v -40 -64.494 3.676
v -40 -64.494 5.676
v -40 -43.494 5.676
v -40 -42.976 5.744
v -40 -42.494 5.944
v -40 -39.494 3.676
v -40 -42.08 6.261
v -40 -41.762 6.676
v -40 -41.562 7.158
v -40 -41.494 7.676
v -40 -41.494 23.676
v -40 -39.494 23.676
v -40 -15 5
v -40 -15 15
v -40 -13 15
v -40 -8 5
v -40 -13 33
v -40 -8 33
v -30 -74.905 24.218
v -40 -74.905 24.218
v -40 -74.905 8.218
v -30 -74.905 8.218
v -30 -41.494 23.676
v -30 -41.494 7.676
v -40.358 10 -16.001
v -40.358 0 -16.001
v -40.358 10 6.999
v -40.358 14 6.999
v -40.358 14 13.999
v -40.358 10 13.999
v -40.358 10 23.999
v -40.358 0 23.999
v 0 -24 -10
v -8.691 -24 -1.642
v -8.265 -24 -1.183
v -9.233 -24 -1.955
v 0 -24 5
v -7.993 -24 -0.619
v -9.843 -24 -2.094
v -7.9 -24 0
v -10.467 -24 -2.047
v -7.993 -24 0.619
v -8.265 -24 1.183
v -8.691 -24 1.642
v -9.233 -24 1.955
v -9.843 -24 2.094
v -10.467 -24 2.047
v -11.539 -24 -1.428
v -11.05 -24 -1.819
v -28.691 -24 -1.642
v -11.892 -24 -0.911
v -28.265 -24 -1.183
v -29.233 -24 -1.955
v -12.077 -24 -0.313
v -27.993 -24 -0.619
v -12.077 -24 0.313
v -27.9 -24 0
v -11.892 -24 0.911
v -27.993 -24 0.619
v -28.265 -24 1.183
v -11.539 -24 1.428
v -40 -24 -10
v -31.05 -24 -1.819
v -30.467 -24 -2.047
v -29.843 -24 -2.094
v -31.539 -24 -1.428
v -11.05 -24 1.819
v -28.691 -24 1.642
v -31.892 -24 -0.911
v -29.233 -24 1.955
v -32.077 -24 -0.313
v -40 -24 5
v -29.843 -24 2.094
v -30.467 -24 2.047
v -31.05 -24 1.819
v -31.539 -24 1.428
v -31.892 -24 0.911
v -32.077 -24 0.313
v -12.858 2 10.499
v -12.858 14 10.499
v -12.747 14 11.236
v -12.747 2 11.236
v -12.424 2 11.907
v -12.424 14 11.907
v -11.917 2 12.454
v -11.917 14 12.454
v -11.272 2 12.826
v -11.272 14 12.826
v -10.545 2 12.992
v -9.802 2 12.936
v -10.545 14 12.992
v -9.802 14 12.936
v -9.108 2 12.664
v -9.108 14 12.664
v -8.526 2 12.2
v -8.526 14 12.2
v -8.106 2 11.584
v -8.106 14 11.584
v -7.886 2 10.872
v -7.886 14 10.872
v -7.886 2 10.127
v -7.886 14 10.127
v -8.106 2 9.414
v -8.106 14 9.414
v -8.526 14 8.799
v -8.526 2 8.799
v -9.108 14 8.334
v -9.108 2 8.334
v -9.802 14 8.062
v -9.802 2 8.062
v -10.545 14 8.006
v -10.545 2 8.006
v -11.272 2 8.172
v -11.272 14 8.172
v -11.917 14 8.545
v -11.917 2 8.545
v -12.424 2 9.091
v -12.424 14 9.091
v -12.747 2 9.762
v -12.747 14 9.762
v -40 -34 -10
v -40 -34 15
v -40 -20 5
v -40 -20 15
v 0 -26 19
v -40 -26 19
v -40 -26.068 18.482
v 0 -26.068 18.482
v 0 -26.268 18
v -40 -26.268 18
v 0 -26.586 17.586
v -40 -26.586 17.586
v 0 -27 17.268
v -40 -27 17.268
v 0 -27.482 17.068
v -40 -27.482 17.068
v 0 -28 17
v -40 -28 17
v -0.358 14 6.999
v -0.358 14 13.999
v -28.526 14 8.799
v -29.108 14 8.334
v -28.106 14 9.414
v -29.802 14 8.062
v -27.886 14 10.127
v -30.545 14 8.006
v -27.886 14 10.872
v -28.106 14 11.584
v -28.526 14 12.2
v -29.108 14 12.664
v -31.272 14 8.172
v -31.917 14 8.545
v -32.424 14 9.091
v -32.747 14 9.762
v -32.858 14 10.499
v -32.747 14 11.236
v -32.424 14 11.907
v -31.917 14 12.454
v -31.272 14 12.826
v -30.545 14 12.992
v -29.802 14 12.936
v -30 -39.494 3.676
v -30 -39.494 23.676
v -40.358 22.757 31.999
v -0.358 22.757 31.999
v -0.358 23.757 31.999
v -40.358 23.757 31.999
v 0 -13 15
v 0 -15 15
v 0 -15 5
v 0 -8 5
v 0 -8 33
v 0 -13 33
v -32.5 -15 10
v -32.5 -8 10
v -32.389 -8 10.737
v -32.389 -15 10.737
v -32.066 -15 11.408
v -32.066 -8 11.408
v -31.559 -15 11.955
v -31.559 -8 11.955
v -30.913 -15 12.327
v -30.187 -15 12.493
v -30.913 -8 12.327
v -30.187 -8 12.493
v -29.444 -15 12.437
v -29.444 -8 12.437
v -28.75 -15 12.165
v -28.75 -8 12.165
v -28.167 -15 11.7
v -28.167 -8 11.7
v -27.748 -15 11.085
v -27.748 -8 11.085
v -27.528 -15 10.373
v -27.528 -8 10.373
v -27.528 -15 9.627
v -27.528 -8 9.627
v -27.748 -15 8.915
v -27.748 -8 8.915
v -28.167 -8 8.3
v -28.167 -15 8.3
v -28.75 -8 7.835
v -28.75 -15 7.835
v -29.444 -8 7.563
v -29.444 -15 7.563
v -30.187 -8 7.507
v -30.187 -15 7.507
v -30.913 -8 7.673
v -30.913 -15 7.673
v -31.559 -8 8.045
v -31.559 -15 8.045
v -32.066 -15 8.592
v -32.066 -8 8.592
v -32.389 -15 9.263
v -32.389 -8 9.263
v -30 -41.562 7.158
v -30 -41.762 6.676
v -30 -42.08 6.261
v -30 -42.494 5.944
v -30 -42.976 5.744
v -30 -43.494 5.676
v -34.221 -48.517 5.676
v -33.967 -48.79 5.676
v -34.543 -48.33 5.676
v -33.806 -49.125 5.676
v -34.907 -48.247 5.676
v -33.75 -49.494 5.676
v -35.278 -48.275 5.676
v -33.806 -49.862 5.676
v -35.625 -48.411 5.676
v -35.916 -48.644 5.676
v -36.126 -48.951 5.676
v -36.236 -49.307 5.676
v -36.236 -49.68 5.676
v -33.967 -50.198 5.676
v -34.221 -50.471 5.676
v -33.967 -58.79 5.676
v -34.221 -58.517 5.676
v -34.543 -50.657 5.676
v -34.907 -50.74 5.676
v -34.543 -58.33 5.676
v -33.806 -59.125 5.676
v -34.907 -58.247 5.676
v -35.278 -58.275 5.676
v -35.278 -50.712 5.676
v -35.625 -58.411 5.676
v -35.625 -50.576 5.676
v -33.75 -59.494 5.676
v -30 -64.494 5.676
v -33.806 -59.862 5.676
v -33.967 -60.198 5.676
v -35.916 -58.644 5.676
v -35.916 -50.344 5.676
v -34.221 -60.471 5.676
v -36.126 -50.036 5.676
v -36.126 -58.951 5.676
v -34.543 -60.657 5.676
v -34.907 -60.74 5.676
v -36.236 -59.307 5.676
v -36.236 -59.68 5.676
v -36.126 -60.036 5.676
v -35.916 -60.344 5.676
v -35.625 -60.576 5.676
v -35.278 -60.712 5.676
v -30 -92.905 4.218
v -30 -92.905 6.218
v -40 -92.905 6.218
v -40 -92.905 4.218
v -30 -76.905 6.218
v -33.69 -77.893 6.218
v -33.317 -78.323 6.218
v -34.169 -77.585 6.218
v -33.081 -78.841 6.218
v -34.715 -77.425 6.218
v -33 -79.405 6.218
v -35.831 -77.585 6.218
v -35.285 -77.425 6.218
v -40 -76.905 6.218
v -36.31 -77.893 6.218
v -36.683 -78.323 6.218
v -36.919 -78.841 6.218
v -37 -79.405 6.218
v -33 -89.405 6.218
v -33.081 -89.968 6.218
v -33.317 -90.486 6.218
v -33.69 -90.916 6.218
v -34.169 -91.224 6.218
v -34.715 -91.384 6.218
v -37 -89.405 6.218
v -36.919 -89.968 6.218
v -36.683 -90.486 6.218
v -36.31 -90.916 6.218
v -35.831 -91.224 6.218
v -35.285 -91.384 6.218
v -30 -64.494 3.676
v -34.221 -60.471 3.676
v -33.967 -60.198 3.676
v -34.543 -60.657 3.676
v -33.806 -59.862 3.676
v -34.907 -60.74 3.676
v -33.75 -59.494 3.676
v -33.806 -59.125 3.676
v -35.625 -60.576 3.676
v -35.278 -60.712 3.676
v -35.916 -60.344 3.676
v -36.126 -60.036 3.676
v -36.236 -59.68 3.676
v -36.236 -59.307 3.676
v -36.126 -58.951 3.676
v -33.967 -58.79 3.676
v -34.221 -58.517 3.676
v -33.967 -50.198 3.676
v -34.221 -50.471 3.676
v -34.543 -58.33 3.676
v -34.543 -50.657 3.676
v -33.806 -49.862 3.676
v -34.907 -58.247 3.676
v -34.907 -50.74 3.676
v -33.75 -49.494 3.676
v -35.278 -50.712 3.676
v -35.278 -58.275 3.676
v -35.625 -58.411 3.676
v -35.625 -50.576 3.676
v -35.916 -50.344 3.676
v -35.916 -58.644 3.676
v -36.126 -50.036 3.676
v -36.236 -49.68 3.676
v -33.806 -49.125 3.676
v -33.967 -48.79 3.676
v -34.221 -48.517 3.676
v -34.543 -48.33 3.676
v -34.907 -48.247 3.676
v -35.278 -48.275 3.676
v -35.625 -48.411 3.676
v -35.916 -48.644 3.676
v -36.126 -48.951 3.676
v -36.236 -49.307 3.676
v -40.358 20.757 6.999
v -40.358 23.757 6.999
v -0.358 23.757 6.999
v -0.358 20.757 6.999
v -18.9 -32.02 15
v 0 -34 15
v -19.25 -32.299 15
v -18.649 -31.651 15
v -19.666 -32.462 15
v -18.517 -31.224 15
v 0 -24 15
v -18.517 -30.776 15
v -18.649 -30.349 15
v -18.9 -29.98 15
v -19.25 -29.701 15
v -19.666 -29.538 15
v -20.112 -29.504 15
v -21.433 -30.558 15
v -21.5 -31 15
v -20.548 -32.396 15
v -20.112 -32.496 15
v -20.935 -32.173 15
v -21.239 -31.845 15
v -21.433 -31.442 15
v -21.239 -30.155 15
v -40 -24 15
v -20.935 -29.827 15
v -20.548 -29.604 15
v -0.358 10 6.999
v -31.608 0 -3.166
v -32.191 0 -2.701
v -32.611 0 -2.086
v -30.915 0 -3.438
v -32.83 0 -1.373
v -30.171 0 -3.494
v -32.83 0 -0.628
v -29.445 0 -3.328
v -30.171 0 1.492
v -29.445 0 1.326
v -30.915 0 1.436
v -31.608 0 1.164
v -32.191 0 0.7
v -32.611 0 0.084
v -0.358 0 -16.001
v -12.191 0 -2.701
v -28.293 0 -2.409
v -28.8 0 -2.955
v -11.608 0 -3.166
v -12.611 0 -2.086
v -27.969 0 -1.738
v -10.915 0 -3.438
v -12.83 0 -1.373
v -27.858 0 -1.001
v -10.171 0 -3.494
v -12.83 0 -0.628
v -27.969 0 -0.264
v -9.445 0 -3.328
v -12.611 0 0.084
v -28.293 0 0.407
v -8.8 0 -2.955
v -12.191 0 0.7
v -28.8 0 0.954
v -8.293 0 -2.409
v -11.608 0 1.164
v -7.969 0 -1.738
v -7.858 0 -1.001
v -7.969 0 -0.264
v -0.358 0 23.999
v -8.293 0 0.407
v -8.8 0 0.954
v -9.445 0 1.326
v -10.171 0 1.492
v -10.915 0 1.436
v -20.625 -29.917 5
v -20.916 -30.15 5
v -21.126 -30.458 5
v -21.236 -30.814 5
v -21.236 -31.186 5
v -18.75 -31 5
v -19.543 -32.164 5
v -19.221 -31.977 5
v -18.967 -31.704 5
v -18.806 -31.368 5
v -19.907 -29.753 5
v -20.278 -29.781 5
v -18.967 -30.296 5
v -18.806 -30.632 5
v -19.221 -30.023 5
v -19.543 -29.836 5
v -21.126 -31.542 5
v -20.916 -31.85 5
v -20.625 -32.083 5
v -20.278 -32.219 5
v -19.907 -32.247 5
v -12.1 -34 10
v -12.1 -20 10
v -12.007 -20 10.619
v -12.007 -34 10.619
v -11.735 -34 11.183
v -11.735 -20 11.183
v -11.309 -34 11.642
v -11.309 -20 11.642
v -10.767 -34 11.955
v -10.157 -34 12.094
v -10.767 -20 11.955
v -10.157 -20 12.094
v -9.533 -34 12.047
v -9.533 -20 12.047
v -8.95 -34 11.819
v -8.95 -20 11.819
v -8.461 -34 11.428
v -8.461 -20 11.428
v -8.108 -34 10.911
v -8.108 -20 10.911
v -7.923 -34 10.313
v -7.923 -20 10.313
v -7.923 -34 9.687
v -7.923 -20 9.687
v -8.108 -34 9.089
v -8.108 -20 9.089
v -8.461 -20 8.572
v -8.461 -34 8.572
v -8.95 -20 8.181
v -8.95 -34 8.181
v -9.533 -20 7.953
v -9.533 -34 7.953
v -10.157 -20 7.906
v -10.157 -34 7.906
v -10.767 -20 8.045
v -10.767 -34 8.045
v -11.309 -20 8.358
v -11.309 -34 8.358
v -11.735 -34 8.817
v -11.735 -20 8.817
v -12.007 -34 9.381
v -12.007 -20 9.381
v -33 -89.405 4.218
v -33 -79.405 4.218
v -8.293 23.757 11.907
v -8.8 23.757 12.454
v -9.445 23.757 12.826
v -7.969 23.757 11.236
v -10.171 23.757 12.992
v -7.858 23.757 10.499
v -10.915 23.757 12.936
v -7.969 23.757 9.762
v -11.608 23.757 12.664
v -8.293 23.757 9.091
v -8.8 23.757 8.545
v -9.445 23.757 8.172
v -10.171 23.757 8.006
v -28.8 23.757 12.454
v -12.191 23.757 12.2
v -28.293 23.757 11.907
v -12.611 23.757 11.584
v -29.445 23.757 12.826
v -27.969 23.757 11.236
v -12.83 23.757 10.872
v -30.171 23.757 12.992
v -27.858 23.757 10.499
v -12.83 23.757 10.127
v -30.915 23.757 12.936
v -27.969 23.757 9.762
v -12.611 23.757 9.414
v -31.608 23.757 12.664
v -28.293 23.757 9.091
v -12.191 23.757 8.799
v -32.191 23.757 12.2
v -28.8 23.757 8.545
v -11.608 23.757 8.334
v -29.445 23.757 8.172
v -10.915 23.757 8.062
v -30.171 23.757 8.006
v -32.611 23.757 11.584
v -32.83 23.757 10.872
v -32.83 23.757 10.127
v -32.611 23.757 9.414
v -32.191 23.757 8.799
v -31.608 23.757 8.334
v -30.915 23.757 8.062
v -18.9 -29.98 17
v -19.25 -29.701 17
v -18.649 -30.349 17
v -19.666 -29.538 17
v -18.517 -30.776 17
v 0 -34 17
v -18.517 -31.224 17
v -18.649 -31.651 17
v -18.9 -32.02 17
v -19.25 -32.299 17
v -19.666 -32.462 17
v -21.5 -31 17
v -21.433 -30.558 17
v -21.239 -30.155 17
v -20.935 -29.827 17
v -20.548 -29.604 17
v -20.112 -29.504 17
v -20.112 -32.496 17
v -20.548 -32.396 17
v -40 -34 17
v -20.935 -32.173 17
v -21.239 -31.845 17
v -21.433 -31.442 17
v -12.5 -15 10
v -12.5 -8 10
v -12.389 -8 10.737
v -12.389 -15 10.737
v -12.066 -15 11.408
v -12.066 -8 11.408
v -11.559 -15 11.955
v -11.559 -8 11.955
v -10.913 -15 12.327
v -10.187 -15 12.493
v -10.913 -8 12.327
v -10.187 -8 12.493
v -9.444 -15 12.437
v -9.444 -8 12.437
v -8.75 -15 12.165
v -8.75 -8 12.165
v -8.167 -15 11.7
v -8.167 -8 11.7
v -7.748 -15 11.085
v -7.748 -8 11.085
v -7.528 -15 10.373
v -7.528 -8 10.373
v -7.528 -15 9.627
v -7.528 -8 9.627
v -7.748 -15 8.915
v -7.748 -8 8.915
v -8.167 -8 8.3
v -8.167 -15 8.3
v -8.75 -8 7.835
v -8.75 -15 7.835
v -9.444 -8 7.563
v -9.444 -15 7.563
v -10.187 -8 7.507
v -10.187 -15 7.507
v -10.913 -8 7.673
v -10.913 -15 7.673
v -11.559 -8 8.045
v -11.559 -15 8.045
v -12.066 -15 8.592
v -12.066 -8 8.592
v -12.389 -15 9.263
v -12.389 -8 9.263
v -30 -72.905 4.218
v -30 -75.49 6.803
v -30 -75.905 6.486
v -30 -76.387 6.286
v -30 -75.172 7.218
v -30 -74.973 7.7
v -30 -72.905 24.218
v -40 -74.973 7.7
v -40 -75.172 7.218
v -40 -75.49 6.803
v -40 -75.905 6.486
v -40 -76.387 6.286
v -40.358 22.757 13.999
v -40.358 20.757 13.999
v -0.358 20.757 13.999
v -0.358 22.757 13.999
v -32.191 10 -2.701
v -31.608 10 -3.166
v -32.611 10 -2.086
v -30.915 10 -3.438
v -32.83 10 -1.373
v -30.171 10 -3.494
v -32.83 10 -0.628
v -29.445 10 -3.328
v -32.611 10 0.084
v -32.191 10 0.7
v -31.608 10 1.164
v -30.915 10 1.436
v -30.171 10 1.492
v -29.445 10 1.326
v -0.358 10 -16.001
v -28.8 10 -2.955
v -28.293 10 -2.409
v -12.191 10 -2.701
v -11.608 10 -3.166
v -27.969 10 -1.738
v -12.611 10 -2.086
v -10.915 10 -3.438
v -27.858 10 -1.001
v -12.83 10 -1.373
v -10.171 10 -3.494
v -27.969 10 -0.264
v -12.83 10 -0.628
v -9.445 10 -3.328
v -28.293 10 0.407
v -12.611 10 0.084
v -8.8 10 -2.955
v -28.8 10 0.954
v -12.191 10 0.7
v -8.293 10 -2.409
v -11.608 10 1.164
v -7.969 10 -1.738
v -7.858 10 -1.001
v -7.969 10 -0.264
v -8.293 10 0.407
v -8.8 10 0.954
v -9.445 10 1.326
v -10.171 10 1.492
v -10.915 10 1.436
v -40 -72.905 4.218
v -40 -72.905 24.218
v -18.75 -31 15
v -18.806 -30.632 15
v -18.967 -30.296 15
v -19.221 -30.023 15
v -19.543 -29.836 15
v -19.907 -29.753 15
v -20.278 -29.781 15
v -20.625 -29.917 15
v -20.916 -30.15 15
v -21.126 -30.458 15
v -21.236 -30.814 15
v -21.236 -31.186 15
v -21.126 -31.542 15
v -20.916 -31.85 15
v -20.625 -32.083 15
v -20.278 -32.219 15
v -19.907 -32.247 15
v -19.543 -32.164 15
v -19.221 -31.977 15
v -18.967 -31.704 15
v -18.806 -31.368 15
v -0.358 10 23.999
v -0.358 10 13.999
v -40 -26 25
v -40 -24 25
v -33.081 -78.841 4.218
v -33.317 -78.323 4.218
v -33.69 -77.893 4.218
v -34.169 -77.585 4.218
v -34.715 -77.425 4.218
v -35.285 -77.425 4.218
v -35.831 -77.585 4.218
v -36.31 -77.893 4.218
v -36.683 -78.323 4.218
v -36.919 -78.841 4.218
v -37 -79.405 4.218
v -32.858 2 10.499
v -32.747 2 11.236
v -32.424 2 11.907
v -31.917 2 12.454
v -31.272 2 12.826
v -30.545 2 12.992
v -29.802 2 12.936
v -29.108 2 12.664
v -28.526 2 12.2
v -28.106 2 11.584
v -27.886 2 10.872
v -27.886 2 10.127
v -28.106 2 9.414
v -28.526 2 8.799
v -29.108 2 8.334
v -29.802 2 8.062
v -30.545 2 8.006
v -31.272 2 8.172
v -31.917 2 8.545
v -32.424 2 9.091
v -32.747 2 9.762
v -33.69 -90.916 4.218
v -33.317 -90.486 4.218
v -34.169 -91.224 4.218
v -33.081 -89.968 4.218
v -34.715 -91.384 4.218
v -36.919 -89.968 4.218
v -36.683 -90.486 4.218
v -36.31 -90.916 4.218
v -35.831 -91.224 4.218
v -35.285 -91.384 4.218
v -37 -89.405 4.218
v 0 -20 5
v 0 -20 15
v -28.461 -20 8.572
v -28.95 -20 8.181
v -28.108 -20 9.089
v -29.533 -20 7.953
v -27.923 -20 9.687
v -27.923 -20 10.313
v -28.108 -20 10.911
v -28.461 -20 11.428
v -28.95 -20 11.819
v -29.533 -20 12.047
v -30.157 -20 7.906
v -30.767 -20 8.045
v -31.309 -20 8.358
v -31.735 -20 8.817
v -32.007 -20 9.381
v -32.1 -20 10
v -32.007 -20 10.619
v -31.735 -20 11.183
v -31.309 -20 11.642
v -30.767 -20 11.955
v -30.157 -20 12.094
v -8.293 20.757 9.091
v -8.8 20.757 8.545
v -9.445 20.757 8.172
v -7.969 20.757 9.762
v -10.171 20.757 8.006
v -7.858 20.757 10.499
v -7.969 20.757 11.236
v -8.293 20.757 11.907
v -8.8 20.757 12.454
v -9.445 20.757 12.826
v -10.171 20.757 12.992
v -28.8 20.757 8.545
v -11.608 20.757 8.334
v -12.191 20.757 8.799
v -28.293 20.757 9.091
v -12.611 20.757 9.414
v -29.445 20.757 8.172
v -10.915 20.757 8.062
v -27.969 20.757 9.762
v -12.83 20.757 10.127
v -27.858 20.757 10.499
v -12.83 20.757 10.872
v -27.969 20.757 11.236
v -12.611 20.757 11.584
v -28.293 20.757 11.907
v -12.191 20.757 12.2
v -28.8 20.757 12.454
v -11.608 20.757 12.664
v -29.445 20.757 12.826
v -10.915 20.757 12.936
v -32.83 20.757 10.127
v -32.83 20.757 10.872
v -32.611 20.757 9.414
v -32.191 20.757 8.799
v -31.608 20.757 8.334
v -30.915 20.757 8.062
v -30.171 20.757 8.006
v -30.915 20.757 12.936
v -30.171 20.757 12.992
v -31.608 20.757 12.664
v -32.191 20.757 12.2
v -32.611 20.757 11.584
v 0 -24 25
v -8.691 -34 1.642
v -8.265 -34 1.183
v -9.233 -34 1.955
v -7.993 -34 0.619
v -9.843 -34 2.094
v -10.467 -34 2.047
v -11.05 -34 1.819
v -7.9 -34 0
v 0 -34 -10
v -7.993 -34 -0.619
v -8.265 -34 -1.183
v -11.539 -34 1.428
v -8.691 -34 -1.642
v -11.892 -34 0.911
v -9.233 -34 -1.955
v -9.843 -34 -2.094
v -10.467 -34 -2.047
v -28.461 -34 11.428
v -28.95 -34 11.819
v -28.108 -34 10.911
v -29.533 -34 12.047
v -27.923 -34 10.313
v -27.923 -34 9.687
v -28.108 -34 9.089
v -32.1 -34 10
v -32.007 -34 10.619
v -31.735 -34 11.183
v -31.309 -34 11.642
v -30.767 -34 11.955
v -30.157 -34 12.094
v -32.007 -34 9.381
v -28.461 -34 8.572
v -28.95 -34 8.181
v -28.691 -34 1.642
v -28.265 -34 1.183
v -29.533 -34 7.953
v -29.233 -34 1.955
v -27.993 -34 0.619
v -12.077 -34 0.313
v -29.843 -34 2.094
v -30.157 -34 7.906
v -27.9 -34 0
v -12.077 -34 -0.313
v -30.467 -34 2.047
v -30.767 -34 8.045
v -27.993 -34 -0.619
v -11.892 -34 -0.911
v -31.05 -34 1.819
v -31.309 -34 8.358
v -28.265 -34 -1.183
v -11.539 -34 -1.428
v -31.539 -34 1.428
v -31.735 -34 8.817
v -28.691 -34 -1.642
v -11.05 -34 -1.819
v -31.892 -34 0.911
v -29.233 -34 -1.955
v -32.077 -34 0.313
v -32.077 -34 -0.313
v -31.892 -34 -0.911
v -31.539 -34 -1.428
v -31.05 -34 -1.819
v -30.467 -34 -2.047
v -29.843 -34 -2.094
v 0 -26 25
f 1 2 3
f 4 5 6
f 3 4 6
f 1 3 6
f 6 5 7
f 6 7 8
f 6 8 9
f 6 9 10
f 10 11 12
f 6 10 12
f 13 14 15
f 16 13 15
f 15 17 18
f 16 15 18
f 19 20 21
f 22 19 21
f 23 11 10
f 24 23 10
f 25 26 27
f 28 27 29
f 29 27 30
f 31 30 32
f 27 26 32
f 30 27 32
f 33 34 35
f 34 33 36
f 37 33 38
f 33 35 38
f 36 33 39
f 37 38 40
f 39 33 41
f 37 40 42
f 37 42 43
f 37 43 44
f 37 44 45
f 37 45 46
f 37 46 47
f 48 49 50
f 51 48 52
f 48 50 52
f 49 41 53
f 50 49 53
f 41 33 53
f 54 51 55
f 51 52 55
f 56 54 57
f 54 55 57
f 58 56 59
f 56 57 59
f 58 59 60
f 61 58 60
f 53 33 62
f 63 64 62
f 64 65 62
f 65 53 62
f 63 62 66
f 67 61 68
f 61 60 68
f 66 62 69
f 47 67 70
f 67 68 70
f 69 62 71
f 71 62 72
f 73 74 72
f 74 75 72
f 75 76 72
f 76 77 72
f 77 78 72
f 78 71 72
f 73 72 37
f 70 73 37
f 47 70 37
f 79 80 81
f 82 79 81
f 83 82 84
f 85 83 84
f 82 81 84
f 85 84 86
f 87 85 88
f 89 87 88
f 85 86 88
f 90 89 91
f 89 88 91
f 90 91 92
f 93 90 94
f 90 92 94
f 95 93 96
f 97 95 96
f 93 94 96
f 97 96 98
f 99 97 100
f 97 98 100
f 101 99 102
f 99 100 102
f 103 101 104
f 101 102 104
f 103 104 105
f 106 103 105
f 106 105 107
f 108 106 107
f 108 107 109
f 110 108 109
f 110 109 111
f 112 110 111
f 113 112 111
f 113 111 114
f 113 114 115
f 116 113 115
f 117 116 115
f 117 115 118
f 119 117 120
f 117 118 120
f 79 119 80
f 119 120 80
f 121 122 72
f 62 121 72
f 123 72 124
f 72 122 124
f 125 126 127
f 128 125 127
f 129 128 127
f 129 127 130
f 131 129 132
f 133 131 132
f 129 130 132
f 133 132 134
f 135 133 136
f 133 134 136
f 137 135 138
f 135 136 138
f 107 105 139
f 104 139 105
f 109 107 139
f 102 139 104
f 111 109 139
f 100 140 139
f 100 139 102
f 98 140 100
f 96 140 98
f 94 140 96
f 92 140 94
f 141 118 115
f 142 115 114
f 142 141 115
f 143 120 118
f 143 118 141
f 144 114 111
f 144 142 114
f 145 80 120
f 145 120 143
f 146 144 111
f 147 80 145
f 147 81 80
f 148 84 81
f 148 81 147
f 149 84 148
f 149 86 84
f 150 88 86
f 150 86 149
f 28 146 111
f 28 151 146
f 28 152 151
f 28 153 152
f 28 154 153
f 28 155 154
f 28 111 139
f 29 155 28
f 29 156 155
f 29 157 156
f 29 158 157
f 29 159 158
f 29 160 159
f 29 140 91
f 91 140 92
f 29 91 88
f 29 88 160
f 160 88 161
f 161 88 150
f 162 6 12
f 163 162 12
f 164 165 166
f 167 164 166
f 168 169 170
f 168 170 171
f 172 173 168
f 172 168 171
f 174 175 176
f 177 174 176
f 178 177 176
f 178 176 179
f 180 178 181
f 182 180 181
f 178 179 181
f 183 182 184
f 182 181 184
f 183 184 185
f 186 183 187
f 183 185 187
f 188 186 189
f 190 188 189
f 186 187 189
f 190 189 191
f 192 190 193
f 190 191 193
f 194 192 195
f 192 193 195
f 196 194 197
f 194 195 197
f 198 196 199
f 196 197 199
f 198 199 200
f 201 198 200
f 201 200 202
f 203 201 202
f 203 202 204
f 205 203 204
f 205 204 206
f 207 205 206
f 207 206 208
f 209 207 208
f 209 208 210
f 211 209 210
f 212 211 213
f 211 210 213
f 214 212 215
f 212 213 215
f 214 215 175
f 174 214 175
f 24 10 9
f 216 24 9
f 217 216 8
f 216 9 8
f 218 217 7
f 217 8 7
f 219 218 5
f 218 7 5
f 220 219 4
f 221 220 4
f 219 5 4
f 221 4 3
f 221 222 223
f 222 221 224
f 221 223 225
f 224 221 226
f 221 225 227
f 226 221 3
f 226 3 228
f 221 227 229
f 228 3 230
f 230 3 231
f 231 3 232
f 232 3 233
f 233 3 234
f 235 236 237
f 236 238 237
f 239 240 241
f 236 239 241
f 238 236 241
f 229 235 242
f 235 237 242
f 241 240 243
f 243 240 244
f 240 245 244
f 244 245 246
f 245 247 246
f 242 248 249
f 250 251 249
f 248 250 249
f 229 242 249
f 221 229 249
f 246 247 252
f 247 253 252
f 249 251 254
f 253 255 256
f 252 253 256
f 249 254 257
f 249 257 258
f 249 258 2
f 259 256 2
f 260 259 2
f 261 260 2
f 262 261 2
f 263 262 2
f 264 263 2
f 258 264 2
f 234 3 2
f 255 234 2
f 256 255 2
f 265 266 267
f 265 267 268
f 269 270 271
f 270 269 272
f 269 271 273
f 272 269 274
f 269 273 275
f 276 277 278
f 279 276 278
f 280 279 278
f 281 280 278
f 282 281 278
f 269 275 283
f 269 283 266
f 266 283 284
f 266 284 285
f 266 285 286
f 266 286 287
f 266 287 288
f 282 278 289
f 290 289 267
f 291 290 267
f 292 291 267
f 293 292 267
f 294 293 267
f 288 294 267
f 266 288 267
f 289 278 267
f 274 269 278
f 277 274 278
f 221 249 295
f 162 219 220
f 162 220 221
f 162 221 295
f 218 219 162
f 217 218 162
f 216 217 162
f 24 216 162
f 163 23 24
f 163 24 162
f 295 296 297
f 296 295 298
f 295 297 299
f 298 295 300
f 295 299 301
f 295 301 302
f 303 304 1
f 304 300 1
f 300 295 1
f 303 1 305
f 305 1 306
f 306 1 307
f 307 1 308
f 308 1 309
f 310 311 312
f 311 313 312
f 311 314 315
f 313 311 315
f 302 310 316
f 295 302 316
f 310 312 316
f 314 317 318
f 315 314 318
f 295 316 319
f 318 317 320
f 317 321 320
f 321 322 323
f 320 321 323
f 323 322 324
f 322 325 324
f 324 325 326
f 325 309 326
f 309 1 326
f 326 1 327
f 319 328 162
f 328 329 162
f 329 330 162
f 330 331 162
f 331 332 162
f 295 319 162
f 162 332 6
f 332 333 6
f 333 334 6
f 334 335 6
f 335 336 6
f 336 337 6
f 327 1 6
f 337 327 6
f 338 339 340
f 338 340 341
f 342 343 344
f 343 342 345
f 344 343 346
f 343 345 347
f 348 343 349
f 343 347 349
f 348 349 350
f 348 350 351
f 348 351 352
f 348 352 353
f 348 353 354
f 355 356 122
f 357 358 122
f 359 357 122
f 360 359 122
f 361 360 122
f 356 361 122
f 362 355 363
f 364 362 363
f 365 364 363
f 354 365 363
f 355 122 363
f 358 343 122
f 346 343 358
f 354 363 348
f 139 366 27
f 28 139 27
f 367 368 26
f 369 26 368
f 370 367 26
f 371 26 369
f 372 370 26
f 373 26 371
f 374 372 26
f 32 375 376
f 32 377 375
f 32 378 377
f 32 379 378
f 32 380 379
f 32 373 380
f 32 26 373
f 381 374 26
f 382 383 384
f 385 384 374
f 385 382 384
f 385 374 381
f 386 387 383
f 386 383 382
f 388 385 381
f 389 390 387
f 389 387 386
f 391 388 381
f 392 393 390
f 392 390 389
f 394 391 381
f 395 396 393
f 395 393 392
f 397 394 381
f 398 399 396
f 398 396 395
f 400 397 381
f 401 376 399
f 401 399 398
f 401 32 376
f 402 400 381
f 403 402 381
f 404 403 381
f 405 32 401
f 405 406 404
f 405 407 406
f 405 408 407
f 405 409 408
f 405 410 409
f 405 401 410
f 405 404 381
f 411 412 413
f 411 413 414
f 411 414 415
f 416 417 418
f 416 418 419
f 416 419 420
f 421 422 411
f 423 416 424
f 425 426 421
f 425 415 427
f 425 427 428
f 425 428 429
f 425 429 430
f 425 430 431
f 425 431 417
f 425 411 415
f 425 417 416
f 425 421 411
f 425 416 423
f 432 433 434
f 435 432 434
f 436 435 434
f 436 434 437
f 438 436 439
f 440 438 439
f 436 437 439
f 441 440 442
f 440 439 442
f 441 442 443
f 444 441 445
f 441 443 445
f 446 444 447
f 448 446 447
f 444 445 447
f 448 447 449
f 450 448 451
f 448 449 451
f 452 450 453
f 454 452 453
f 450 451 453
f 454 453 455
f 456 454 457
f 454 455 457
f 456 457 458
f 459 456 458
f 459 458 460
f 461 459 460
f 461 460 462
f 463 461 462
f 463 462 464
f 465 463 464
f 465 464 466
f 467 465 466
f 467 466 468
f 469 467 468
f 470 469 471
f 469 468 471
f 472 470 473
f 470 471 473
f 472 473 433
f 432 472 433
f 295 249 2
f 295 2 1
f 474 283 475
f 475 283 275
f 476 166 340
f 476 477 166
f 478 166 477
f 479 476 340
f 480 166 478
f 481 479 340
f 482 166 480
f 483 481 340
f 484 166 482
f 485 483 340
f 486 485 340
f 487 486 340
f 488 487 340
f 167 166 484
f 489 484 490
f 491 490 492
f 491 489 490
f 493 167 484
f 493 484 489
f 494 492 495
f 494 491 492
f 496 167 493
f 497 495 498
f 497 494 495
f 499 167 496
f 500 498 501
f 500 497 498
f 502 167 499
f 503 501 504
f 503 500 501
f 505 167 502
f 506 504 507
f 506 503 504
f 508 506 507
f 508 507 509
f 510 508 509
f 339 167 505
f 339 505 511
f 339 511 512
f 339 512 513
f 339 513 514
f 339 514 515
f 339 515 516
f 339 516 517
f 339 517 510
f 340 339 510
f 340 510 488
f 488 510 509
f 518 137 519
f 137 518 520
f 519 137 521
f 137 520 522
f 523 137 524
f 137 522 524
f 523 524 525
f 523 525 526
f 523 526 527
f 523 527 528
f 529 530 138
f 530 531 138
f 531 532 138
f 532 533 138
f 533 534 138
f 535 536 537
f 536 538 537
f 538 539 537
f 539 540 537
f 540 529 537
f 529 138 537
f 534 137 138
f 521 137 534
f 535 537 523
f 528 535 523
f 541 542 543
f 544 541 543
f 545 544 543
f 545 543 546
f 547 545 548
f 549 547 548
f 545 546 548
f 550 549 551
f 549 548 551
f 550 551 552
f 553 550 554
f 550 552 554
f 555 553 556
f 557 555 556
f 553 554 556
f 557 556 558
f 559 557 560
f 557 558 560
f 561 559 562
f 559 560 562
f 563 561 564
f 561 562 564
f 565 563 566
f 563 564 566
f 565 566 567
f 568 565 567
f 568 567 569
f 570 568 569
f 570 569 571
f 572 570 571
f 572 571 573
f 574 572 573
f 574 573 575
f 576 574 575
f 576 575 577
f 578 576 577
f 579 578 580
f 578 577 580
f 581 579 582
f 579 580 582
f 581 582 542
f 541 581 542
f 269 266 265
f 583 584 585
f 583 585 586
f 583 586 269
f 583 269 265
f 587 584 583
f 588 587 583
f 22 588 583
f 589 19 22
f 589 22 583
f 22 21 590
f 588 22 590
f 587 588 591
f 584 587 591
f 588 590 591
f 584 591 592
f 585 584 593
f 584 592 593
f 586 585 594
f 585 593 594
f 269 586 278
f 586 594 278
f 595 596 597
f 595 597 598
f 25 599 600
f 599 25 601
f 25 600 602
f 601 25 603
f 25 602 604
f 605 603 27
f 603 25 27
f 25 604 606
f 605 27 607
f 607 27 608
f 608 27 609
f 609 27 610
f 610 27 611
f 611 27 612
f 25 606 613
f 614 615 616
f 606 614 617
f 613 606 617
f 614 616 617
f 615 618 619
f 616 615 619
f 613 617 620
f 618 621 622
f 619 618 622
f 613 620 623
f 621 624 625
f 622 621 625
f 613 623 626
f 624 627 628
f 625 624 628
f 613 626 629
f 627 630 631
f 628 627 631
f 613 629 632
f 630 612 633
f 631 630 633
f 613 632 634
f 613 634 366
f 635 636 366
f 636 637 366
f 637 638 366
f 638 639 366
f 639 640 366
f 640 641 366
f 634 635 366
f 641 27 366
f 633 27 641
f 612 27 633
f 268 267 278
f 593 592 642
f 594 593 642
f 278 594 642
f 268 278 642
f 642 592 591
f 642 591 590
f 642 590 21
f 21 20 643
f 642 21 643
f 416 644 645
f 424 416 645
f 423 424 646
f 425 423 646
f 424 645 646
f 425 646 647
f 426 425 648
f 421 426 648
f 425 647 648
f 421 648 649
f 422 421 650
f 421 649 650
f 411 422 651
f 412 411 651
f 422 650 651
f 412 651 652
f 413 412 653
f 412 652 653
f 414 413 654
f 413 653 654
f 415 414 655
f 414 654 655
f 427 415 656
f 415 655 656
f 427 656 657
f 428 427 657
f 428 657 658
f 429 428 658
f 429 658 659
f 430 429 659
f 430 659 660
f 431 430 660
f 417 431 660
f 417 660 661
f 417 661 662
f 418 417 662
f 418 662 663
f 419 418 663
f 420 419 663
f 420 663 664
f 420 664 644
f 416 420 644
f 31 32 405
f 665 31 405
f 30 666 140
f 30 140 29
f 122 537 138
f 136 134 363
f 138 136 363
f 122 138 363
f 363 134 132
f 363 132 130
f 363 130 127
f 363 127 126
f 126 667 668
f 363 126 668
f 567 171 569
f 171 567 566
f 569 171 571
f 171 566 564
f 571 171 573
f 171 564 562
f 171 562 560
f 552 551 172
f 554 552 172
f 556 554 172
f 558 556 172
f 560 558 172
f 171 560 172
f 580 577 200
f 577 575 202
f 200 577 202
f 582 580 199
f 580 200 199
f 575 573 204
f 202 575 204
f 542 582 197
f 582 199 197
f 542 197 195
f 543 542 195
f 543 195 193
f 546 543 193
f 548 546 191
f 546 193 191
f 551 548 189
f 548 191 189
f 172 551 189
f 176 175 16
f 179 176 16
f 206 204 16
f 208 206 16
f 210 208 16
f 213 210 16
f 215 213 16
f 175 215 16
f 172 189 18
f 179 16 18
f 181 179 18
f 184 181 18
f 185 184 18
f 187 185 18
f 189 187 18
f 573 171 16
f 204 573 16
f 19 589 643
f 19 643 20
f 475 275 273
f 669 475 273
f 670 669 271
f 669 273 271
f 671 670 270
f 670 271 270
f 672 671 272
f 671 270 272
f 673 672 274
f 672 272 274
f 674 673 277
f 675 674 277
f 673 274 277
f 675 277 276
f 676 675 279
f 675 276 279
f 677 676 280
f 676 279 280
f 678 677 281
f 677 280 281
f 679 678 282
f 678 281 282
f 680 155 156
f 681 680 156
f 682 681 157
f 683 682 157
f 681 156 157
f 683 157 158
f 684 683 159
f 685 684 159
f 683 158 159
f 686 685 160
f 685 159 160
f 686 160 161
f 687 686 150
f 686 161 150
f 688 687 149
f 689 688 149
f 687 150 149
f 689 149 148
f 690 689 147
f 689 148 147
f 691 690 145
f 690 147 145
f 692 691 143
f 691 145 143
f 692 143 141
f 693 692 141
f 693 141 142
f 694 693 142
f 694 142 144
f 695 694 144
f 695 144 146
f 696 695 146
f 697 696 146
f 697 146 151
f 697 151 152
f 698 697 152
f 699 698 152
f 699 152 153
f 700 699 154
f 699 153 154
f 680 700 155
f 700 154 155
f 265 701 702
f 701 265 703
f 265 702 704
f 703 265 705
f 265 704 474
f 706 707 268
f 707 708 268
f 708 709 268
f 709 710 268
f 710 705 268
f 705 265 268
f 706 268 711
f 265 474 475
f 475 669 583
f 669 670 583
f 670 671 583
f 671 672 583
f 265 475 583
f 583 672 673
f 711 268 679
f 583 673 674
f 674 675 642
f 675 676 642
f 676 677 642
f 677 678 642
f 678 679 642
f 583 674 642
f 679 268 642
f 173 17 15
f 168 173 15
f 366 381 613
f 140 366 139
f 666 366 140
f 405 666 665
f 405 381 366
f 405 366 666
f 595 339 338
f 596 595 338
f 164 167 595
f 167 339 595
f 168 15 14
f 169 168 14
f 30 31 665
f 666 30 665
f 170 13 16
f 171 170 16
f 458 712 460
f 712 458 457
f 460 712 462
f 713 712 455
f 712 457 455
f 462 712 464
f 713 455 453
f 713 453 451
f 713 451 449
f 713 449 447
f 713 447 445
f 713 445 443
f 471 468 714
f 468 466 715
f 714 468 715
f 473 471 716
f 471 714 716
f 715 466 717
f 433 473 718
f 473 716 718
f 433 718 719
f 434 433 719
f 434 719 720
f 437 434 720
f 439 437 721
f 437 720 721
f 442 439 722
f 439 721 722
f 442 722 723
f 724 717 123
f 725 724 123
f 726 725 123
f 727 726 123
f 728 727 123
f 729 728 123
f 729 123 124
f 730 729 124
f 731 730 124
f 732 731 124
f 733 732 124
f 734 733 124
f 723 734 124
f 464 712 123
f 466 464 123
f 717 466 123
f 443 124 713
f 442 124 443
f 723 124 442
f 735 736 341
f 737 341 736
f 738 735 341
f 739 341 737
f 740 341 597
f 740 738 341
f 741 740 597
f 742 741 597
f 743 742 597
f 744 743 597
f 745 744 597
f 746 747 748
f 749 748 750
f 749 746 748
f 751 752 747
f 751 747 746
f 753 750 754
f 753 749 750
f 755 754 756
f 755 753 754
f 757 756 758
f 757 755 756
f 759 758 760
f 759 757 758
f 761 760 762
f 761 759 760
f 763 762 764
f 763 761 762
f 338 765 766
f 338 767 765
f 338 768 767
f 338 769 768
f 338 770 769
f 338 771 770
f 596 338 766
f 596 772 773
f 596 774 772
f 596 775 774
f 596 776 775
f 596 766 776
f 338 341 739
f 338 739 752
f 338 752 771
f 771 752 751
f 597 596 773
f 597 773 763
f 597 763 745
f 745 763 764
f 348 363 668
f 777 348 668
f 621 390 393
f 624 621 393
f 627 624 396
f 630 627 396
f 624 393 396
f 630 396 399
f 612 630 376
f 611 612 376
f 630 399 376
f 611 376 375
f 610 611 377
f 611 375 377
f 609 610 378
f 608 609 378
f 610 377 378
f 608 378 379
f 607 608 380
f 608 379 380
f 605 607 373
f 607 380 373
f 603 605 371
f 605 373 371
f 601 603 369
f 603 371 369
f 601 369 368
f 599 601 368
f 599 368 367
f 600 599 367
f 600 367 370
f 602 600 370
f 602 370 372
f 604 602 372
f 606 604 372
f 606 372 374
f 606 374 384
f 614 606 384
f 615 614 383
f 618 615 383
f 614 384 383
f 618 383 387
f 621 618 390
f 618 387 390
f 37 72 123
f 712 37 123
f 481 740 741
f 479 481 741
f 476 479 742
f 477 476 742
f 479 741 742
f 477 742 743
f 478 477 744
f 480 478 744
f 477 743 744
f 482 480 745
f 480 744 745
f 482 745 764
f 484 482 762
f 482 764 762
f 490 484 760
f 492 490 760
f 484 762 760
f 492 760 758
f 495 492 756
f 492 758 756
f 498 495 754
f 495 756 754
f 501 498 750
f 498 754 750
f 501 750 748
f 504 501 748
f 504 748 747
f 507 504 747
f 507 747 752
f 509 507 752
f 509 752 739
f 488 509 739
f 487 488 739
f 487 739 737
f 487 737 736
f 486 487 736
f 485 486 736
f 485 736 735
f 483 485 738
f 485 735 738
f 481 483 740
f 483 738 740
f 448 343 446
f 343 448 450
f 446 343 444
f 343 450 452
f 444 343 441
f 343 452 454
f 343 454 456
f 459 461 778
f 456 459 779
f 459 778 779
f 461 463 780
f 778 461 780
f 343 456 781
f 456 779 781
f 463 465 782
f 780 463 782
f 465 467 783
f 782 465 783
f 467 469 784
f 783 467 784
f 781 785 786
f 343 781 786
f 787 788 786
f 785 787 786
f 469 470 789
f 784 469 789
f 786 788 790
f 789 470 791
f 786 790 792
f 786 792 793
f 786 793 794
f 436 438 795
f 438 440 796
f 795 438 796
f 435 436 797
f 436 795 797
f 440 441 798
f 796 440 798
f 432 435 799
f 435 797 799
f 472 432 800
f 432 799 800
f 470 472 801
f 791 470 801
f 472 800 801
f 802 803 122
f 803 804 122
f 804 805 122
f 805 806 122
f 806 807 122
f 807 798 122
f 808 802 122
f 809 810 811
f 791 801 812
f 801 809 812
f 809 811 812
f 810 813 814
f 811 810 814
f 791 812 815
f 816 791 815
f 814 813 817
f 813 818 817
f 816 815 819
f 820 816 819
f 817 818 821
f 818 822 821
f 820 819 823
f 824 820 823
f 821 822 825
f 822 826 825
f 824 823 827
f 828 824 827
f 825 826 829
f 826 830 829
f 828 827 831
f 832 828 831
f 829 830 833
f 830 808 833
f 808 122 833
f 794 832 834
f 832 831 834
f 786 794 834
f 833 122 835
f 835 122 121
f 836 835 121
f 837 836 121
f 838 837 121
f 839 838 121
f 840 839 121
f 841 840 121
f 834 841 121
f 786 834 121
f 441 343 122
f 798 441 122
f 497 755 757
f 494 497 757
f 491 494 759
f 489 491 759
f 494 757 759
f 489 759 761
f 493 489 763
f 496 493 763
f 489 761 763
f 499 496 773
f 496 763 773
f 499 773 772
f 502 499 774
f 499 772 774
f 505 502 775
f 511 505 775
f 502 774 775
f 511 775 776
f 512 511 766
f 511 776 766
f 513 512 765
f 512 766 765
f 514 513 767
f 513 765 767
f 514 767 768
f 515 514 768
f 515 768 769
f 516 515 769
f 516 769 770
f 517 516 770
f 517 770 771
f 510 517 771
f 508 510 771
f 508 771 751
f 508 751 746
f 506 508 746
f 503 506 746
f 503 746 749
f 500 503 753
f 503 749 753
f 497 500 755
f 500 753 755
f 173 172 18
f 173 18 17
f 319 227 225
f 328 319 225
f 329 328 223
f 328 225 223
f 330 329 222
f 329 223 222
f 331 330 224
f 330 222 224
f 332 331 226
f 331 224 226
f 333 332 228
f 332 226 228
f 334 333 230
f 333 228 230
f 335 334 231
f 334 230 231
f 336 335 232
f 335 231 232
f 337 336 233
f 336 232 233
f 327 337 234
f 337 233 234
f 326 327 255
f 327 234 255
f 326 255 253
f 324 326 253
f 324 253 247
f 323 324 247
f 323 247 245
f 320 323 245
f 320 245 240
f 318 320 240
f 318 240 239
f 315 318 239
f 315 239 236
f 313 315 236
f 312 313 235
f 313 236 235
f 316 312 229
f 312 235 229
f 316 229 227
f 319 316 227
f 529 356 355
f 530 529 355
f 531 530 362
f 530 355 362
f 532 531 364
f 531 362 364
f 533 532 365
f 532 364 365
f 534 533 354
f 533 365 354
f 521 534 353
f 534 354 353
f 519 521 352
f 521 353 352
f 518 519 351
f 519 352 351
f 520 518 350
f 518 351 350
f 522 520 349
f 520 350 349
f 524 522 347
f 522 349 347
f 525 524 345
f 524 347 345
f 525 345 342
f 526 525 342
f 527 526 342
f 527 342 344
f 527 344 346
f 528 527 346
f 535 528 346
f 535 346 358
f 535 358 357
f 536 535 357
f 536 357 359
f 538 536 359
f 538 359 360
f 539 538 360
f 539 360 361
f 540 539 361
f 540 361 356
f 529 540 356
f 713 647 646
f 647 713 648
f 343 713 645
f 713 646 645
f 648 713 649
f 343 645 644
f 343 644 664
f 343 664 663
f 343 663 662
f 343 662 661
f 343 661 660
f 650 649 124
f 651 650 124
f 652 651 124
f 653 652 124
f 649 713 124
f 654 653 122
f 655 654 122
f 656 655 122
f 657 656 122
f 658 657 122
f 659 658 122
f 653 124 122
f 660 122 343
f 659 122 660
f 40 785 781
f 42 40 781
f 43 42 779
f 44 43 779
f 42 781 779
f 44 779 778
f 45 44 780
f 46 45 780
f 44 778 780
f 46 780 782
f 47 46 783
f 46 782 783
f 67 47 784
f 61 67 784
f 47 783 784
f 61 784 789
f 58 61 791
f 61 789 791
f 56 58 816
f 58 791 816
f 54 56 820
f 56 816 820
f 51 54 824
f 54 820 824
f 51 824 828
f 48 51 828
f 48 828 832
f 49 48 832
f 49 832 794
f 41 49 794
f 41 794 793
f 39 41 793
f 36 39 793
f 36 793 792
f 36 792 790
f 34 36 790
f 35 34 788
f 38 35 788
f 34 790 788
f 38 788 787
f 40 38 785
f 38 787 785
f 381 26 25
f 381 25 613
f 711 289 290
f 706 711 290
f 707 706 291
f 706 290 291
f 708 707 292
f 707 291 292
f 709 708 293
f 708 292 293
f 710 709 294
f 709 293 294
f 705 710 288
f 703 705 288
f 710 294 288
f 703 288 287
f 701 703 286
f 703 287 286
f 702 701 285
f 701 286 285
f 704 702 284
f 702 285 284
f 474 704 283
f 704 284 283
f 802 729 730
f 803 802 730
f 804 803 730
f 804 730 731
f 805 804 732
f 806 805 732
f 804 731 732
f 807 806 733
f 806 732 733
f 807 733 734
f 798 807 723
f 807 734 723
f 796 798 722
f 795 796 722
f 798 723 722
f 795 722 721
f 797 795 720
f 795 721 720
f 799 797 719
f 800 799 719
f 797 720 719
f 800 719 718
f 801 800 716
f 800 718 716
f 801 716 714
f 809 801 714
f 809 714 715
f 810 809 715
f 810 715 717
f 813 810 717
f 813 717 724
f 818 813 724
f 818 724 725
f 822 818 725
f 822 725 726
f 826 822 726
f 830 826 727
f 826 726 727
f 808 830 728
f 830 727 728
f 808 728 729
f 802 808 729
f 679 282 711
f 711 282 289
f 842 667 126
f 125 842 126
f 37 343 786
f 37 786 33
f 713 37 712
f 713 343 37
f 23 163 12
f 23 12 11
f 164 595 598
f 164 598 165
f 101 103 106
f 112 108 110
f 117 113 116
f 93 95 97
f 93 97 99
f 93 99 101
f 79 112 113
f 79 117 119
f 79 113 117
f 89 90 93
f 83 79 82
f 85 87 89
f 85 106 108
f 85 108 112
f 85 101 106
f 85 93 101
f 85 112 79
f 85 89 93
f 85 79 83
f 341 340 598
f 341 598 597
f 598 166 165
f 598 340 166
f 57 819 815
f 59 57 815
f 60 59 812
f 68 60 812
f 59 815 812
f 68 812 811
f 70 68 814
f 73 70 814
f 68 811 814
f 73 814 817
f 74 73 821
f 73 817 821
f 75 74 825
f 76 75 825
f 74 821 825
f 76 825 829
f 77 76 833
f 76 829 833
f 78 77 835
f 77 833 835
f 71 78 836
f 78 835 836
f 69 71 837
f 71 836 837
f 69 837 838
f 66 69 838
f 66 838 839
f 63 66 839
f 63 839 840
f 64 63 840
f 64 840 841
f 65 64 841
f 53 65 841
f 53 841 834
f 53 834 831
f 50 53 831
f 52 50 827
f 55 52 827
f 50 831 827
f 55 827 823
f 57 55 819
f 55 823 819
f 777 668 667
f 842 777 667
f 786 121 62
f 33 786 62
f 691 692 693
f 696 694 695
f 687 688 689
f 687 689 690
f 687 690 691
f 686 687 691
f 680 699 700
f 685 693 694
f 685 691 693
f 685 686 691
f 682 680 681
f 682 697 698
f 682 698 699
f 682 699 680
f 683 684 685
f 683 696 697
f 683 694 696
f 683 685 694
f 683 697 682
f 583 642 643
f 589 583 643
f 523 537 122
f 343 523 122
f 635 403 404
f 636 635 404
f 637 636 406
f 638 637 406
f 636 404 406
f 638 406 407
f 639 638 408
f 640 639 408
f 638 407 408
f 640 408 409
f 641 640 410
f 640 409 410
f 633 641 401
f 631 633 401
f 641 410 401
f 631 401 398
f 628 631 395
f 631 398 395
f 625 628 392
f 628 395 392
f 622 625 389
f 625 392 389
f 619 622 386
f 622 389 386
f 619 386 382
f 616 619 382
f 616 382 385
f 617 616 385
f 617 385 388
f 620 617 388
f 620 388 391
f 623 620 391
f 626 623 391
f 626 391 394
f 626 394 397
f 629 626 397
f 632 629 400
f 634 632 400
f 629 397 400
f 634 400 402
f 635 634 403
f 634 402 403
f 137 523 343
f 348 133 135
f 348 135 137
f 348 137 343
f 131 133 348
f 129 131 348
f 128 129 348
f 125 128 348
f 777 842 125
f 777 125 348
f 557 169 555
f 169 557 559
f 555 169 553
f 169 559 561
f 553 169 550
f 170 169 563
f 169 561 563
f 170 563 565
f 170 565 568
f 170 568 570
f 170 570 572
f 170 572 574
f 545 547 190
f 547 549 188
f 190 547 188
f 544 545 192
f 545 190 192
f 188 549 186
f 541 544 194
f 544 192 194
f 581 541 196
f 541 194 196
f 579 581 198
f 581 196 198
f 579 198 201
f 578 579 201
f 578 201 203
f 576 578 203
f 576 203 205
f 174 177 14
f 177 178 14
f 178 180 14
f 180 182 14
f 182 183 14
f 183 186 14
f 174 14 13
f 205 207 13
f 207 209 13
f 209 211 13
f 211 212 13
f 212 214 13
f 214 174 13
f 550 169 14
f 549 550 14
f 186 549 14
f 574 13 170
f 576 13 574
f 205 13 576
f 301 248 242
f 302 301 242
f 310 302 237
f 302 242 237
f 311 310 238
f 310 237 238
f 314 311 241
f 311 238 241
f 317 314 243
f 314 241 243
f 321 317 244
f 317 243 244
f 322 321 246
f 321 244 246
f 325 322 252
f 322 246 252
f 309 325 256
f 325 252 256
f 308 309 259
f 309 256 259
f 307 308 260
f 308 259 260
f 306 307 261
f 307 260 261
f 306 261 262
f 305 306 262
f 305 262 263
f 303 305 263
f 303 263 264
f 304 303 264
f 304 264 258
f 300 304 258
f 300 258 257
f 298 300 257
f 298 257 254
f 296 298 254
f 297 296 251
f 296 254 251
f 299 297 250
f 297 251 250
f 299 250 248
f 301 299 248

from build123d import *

# Parameters (mm, degrees)
F1_W      = 40
F1_H      = 40
F1_R      = 2.5
F2_DEPTH  = 10
F3_W      = 40
F3_H      = 7
F4_DEPTH  = 4
F5_R      = 2.5
F6_DEPTH  = 12
F8_DEPTH  = 40
F9_R      = 2.5
F10_DEPTH = 3
F12_DEPTH = 40
F14_DEPTH = 40
F18_DEPTH = 40
F15_R     = 2.1
F20_DEPTH = 10
F16_R     = 2.5
F21_DEPTH = 7
F19_R     = 1.25
F22_DEPTH = 12
F24_DEPTH = 10
F25_R     = 1.25
F26_DEPTH = 2
F28_DEPTH = 10
F30_DEPTH = 3
F31_R     = 2.1
F32_DEPTH = 14
F33_D     = 3


# Not quite as in the source:
# - a feature names something its author has since deleted; it is built from what else it names


with BuildPart() as f2:
    # F1 (on Front) → F2 (new body)
    with BuildSketch(Plane.XZ):
        with Locations((-20.3582742298, 3.9991794988)):
            Rectangle(F1_W, F1_H)
        with Locations((-30.3582742298, -1.0008205012)):
            Circle(F1_R, mode=Mode.SUBTRACT)
        with Locations((-10.3582742298, -1.0008205012)):
            Circle(F1_R, mode=Mode.SUBTRACT)
    extrude(amount=-F2_DEPTH)

    # F3 (on face) → F4 (join)
    with BuildSketch(Plane(origin=(0, 10, 0), x_dir=(-1, 0, 0), z_dir=(0, 1, 0))):
        with Locations((20.3582742298, 10.4991794988)):
            Rectangle(F3_W, F3_H)
    extrude(amount=F4_DEPTH)

    # F5 (on face) → F6 (cut)
    with BuildSketch(Plane(origin=(0, 14, 0), x_dir=(-1, 0, 0), z_dir=(0, 1, 0))):
        with Locations((10.3582742298, 10.4991794988)):
            Circle(F5_R)
        with Locations((30.3582742298, 10.4991794988)):
            Circle(F5_R)
    extrude(amount=-F6_DEPTH, mode=Mode.SUBTRACT)


with BuildPart() as f8:
    # F7 (on face) → F8 (new body)
    with BuildSketch(Plane(origin=(-40.3582742298, 0, 0), x_dir=(0, -1, 0), z_dir=(-1, 0, 0))):
        Polygon((-22.7574642788, 31.9991794988), (-23.7574642788, 31.9991794988), (-23.7574642788, 6.9991794988), (-20.7574642788, 6.9991794988), (-20.7574642788, 13.9991794988), (-22.7574642788, 13.9991794988), align=None)
    extrude(amount=-F8_DEPTH)

    # F9 (on face) → F10 (cut)
    with BuildSketch(Plane.XZ.offset(-20.7574642788)):
        with Locations((-30.3582742298, 10.4991794988)):
            Circle(F9_R)
        with Locations((-10.3582742298, 10.4991794988)):
            Circle(F9_R)
    extrude(amount=-F10_DEPTH, mode=Mode.SUBTRACT)


with BuildPart() as f12:
    # F11 (on offset) → F12 (new body)
    with BuildSketch(Plane.YZ.offset(-40)):
        Polygon((-20, 5), (-20, 15), (-34, 15), (-34, -10), (-24, -10), (-24, 5), align=None)
    extrude(amount=F12_DEPTH)

    # F15 (on face) → F20 (cut)
    with BuildSketch(Plane.XZ.offset(34)):
        with Locations((-30, 0)):
            Circle(F15_R)
        with Locations((-10, 0)):
            Circle(F15_R)
    extrude(amount=-F20_DEPTH, mode=Mode.SUBTRACT)


with BuildPart() as f14:
    # F13 (on offset) → F14 (new body)
    with BuildSketch(Plane.YZ.offset(-40)):
        Polygon((-8, 5), (-8, 33), (-13, 33), (-13, 15), (-15, 15), (-15, 5), align=None)
    extrude(amount=F14_DEPTH)

    # F16 (on face) → F21 (cut)
    with BuildSketch(Plane(origin=(0, -8, 0), x_dir=(-1, 0, 0), z_dir=(0, 1, 0))):
        with Locations((10, 10)):
            Circle(F16_R)
        with Locations((30, 10)):
            Circle(F16_R)
    extrude(amount=-F21_DEPTH, mode=Mode.SUBTRACT)


with BuildPart() as f18:
    # F17 (on offset) → F18 (new body)
    with BuildSketch(Plane.YZ.offset(-40)):
        with BuildLine():
            Line((-24, 15), (-24, 25))
            Line((-24, 25), (-26, 25))
            Line((-26, 25), (-26, 19))
            ThreePointArc((-26, 19), (-26.5857864376, 17.5857864376), (-28, 17))
            Line((-28, 17), (-34, 17))
            Line((-34, 17), (-34, 15))
            Line((-34, 15), (-24, 15))
        make_face()
    extrude(amount=F18_DEPTH)


with BuildPart() as f22_tool:
    # F19 (on face) → F22 (new body)
    with BuildSketch(Plane.XY.offset(17)):
        with Locations((-20, -31)):
            Circle(F19_R)
    extrude(amount=-F22_DEPTH)


with BuildPart() as f12_1:
    add(f12.part)

    # F22: cut by f22_tool
    add(f22_tool.part, mode=Mode.SUBTRACT)

    # F31 (on face) → F32 (cut)
    with BuildSketch(Plane(origin=(0, -20, 0), x_dir=(-1, 0, 0), z_dir=(0, 1, 0))):
        with Locations((30, 10)):
            Circle(F31_R)
        with Locations((10, 10)):
            Circle(F31_R)
    extrude(amount=-F32_DEPTH, mode=Mode.SUBTRACT)


with BuildPart() as f18_1:
    add(f18.part)

    # F22: cut by f22_tool
    add(f22_tool.part, mode=Mode.SUBTRACT)

    # F33 (through all)
    with Locations(Plane.XY.offset(17)):
        with Locations((-20, -31)):
            Hole(F33_D / 2)


with BuildPart() as f24:
    # F23 (on offset) → F24 (new body)
    with BuildSketch(Plane.YZ.offset(-40)):
        with BuildLine():
            Line((-39.4938005805, 3.6755907349), (-39.4938005805, 23.6755907349))
            Line((-39.4938005805, 23.6755907349), (-41.4938005805, 23.6755907349))
            Line((-41.4938005805, 23.6755907349), (-41.4938005805, 7.6755907349))
            ThreePointArc((-41.4938005805, 7.6755907349), (-42.0795870181, 6.2613771726), (-43.4938005805, 5.6755907349))
            Line((-43.4938005805, 5.6755907349), (-64.4938005805, 5.6755907349))
            Line((-64.4938005805, 5.6755907349), (-64.4938005805, 3.6755907349))
            Line((-64.4938005805, 3.6755907349), (-39.4938005805, 3.6755907349))
        make_face()
    extrude(amount=F24_DEPTH)

    # F25 (on face) → F26 (cut)
    with BuildSketch(Plane.XY.offset(5.6755907349)):
        with Locations((-35, -49.4938005805)):
            Circle(F25_R)
        with Locations((-35, -59.4938005805)):
            Circle(F25_R)
    extrude(amount=-F26_DEPTH, mode=Mode.SUBTRACT)


with BuildPart() as f28:
    # F27 (on offset) → F28 (new body)
    with BuildSketch(Plane.YZ.offset(-40)):
        with BuildLine():
            Line((-72.9045346379, 4.2176819406), (-72.9045346379, 24.2176819406))
            Line((-72.9045346379, 24.2176819406), (-74.9045346379, 24.2176819406))
            Line((-74.9045346379, 24.2176819406), (-74.9045346379, 8.2176819406))
            ThreePointArc((-74.9045346379, 8.2176819406), (-75.4903210756, 6.8034683783), (-76.9045346379, 6.2176819406))
            Line((-76.9045346379, 6.2176819406), (-92.9045346379, 6.2176819406))
            Line((-92.9045346379, 6.2176819406), (-92.9045346379, 4.2176819406))
            Line((-92.9045346379, 4.2176819406), (-72.9045346379, 4.2176819406))
        make_face()
    extrude(amount=F28_DEPTH)

    # F29 (on face) → F30 (cut)
    with BuildSketch(Plane.XY.offset(6.2176819406)):
        with BuildLine():
            Line((-37, -79.4045346379), (-37, -89.4045346379))
            ThreePointArc((-37, -89.4045346379), (-35, -91.4045346379), (-33, -89.4045346379))
            Line((-33, -89.4045346379), (-33, -79.4045346379))
            ThreePointArc((-33, -79.4045346379), (-35, -77.4045346379), (-37, -79.4045346379))
        make_face()
    extrude(amount=-F30_DEPTH, mode=Mode.SUBTRACT)


solid = Compound([f2.part, f8.part, f14.part, f12_1.part, f18_1.part, f24.part, f28.part])
